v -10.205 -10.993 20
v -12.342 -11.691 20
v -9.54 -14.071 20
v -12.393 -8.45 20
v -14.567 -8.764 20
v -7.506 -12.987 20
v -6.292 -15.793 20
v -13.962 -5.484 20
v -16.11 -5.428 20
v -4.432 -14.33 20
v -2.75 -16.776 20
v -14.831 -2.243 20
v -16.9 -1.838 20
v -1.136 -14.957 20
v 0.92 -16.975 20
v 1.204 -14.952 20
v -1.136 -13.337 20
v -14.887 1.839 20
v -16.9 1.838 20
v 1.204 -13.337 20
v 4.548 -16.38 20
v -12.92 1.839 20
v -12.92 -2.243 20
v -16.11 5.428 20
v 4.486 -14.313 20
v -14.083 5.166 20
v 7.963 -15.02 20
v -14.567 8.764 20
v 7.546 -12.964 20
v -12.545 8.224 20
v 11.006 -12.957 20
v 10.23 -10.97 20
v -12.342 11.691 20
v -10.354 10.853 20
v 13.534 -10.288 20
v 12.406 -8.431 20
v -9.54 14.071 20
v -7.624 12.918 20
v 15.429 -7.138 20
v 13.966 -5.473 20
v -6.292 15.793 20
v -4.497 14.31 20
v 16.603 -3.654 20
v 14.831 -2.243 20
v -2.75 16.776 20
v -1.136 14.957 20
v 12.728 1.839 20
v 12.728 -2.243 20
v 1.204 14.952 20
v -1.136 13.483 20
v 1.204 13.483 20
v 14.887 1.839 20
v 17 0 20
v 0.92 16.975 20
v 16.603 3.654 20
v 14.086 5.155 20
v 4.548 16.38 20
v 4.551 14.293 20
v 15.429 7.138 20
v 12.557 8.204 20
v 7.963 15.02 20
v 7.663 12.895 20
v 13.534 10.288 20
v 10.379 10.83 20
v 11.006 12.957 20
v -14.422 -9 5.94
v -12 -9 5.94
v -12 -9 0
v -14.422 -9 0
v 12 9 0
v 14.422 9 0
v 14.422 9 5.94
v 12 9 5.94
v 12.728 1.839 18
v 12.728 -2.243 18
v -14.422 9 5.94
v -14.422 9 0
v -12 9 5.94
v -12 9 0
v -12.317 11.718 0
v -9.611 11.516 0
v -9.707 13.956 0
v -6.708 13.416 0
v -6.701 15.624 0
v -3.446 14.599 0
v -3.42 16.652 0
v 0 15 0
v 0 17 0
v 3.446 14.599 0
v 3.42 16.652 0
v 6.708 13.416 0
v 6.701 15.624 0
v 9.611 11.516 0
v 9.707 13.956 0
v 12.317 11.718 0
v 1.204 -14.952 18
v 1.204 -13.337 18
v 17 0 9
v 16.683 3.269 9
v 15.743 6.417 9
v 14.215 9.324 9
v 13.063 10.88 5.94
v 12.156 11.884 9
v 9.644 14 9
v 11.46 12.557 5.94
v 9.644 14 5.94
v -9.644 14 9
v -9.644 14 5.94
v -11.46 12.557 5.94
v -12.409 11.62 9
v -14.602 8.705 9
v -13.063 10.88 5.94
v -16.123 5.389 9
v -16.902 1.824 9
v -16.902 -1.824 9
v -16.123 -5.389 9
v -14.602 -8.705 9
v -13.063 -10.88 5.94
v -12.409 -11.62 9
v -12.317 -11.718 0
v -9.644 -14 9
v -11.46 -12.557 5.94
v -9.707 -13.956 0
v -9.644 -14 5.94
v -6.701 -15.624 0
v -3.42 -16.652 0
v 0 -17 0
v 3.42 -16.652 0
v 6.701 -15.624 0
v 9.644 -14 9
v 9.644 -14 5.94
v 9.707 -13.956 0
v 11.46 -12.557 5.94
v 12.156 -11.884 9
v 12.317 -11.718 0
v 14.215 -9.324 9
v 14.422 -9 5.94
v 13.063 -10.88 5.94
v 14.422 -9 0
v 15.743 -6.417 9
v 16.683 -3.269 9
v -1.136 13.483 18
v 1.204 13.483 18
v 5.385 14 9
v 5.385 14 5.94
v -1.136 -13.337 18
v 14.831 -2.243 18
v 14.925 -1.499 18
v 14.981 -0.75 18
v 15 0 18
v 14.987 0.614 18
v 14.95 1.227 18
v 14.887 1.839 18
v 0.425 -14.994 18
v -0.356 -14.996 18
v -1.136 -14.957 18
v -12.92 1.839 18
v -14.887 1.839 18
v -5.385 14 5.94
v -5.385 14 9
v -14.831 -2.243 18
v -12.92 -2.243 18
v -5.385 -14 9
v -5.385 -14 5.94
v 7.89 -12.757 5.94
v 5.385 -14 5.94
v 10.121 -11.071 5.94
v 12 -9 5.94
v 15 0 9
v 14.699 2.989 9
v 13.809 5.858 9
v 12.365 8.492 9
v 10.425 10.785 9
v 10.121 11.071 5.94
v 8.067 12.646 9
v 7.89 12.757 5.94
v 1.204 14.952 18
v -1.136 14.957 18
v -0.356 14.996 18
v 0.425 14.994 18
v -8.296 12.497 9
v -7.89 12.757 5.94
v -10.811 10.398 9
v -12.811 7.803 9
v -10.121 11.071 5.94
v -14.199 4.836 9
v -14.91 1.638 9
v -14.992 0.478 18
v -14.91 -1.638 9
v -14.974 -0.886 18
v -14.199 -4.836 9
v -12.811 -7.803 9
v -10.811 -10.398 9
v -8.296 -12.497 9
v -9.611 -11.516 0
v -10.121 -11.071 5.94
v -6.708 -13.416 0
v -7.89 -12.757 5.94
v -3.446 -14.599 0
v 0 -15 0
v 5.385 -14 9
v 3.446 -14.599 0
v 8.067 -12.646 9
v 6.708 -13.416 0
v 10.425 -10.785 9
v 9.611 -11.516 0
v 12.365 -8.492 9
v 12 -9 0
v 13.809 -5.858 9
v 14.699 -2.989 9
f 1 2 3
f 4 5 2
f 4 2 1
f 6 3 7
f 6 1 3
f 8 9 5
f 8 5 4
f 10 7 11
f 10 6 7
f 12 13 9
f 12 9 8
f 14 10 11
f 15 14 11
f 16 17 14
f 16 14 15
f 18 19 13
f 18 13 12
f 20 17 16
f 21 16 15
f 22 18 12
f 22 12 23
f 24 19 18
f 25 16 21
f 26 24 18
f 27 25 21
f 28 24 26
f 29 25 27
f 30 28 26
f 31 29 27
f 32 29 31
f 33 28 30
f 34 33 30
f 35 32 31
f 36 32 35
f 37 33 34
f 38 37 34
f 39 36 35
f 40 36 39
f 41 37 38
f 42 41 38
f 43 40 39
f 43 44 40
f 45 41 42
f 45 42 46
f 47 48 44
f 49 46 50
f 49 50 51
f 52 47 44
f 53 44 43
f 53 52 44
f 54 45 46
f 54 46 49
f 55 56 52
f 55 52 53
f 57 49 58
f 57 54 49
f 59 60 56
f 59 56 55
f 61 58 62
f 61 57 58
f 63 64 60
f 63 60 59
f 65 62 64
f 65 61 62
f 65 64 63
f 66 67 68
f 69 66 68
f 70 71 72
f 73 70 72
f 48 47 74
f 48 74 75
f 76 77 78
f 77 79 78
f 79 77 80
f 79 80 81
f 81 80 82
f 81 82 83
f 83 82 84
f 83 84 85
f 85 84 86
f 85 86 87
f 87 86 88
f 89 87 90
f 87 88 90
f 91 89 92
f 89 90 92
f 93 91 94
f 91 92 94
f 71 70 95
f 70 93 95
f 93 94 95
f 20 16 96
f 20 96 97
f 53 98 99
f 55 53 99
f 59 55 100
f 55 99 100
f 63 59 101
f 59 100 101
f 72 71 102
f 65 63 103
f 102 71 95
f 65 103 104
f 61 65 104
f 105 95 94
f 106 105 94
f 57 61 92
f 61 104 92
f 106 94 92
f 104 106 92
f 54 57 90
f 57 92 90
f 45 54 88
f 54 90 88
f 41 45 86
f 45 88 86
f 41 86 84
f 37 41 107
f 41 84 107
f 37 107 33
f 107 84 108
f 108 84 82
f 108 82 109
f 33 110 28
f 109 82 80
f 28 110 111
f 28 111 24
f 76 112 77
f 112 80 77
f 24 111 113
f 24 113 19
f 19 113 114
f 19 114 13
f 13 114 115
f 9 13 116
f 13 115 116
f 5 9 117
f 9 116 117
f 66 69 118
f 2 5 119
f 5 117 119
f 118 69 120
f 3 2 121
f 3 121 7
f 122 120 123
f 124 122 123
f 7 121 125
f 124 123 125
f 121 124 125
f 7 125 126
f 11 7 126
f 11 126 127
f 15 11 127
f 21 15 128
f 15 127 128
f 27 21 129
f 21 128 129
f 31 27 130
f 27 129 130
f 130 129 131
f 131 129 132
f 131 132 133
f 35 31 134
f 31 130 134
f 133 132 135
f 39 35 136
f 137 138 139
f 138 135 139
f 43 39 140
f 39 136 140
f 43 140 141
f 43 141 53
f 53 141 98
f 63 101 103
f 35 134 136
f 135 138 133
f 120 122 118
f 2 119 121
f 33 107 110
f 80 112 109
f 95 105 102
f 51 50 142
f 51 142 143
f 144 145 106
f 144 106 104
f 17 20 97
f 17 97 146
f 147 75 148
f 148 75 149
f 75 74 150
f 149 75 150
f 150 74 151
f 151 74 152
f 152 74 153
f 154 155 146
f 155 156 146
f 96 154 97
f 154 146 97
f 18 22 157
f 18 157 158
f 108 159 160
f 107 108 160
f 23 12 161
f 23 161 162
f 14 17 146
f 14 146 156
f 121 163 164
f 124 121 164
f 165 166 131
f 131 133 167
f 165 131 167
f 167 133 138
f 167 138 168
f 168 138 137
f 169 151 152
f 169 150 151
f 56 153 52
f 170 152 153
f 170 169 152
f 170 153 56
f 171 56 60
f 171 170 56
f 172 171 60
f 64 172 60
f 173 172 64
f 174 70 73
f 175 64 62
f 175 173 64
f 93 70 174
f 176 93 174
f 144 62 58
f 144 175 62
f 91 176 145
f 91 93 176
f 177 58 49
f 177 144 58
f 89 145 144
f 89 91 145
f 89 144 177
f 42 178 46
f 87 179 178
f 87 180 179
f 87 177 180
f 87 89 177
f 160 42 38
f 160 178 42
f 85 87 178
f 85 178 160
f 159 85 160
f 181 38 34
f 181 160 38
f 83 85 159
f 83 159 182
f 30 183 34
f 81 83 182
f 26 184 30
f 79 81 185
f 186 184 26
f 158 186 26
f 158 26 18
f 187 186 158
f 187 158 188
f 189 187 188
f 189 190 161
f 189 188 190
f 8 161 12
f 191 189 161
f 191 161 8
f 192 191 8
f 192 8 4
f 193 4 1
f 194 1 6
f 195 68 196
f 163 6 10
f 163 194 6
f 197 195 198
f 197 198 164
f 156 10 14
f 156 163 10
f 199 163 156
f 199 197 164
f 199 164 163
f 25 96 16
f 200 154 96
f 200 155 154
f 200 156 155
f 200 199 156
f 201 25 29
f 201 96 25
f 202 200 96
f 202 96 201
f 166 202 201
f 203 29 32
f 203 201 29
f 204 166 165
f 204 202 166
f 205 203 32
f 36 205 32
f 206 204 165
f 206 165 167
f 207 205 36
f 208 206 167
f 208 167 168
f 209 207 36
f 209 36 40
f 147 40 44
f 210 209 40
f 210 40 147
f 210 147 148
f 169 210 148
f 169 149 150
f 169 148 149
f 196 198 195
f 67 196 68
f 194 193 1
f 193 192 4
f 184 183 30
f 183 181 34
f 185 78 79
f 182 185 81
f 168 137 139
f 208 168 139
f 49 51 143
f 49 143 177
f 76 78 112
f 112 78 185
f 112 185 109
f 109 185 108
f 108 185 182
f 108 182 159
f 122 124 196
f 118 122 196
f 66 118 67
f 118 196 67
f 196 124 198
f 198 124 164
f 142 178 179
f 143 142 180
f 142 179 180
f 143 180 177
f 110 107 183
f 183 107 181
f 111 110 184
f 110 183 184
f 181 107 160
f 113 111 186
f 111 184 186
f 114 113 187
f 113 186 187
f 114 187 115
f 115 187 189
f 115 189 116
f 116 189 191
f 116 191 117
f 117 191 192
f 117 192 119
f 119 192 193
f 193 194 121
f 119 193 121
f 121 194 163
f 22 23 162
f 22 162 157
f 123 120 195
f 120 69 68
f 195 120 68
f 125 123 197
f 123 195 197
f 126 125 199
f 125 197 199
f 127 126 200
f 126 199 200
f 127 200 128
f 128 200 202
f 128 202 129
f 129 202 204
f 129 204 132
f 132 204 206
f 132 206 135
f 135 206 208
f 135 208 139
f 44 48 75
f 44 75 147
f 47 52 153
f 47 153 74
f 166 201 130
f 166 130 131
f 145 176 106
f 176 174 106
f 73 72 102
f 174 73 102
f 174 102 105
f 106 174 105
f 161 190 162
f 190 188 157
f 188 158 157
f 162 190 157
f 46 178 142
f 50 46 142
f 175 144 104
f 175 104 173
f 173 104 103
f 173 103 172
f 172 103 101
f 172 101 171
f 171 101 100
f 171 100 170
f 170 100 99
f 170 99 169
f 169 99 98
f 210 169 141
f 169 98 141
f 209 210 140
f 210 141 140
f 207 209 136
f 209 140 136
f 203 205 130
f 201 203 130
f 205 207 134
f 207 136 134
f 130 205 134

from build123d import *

# Parameters (mm, degrees)
F0_R     = 17
F0_R_2   = 15
F1_DEPTH = 20
F3_DEPTH = 25
F5_DEPTH = 2
F7_DEPTH = 2


with BuildPart() as f1:
    # F0 (on Top) → F1 (new body)
    with BuildSketch(Plane.XY):
        Circle(F0_R)
        Circle(F0_R_2, mode=Mode.SUBTRACT)
    extrude(amount=F1_DEPTH)

    # F2 (on Right) → F3 (cut, symmetric)
    with BuildSketch(Plane.YZ):
        Polygon((-9, 5.94), (-9, -6.120001), (9, -5.76), (9, 5.94), (14, 5.94), (14, 9.000001), (-14, 9.000001), (-14, 5.94), align=None)
    extrude(amount=F3_DEPTH, both=True, mode=Mode.SUBTRACT)

    # F4 (on face) → F5 (join)
    with BuildSketch(Plane.XY.offset(20)):
        with BuildLine():
            ThreePointArc((-14.831288, -2.243409), (-14.998609, -0.204311), (-14.886893, 1.838588))
            Line((-14.886893, 1.838588), (-16.424584, 1.838588))
            Line((-16.424584, 1.838588), (-16.424584, -2.243409))
            Line((-16.424584, -2.243409), (-14.831288, -2.243409))
        make_face()
        with BuildLine():
            Line((-12.919951, -2.243409), (-12.919951, 1.838588))
            Line((-12.919951, 1.838588), (-14.886893, 1.838588))
            ThreePointArc((-14.886893, 1.838588), (-14.998609, -0.204311), (-14.831288, -2.243409))
            Line((-14.831288, -2.243409), (-12.919951, -2.243409))
        make_face()
        with BuildLine():
            Line((14.886893, 1.838588), (12.728207, 1.838588))
            Line((12.728207, 1.838588), (12.728207, -2.243409))
            Line((12.728207, -2.243409), (14.831288, -2.243409))
            ThreePointArc((14.831288, -2.243409), (14.957763, -1.124872), (15, 0))
            ThreePointArc((15, 0), (14.971697, 0.921032), (14.886893, 1.838588))
        make_face()
        with BuildLine():
            Line((16.602479, 1.838588), (14.886893, 1.838588))
            ThreePointArc((14.886893, 1.838588), (14.971697, 0.921032), (15, 0))
            ThreePointArc((15, 0), (14.957763, -1.124872), (14.831288, -2.243409))
            Line((14.831288, -2.243409), (16.602479, -2.243409))
            Line((16.602479, -2.243409), (16.602479, 1.838588))
        make_face()
    extrude(amount=-F5_DEPTH)

    # F6 (on face) → F7 (join)
    with BuildSketch(Plane.XY.offset(20)):
        with BuildLine():
            ThreePointArc((1.204057, 14.951597), (0.034161, 14.999961), (-1.135944, 14.956926))
            Line((-1.135944, 14.956926), (-1.135944, 13.48272))
            Line((-1.135944, 13.48272), (1.204057, 13.48272))
            Line((1.204057, 13.48272), (1.204057, 14.951597))
        make_face()
        with BuildLine():
            Line((1.204057, 16.09272), (-1.135944, 16.09272))
            Line((-1.135944, 16.09272), (-1.135944, 14.956926))
            ThreePointArc((-1.135944, 14.956926), (0.034161, 14.999961), (1.204057, 14.951597))
            Line((1.204057, 14.951597), (1.204057, 16.09272))
        make_face()
        with BuildLine():
            ThreePointArc((1.204057, -14.951597), (0.034161, -14.999961), (-1.135944, -14.956926))
            Line((-1.135944, -14.956926), (-1.135944, -15.857281))
            Line((-1.135944, -15.857281), (1.204057, -15.857281))
            Line((1.204057, -15.857281), (1.204057, -14.951597))
        make_face()
        with BuildLine():
            Line((1.204057, -13.337282), (-1.135944, -13.337282))
            Line((-1.135944, -13.337282), (-1.135944, -14.956926))
            ThreePointArc((-1.135944, -14.956926), (0.034161, -14.999961), (1.204057, -14.951597))
            Line((1.204057, -14.951597), (1.204057, -13.337282))
        make_face()
    extrude(amount=-F7_DEPTH)


solid = f1.part
